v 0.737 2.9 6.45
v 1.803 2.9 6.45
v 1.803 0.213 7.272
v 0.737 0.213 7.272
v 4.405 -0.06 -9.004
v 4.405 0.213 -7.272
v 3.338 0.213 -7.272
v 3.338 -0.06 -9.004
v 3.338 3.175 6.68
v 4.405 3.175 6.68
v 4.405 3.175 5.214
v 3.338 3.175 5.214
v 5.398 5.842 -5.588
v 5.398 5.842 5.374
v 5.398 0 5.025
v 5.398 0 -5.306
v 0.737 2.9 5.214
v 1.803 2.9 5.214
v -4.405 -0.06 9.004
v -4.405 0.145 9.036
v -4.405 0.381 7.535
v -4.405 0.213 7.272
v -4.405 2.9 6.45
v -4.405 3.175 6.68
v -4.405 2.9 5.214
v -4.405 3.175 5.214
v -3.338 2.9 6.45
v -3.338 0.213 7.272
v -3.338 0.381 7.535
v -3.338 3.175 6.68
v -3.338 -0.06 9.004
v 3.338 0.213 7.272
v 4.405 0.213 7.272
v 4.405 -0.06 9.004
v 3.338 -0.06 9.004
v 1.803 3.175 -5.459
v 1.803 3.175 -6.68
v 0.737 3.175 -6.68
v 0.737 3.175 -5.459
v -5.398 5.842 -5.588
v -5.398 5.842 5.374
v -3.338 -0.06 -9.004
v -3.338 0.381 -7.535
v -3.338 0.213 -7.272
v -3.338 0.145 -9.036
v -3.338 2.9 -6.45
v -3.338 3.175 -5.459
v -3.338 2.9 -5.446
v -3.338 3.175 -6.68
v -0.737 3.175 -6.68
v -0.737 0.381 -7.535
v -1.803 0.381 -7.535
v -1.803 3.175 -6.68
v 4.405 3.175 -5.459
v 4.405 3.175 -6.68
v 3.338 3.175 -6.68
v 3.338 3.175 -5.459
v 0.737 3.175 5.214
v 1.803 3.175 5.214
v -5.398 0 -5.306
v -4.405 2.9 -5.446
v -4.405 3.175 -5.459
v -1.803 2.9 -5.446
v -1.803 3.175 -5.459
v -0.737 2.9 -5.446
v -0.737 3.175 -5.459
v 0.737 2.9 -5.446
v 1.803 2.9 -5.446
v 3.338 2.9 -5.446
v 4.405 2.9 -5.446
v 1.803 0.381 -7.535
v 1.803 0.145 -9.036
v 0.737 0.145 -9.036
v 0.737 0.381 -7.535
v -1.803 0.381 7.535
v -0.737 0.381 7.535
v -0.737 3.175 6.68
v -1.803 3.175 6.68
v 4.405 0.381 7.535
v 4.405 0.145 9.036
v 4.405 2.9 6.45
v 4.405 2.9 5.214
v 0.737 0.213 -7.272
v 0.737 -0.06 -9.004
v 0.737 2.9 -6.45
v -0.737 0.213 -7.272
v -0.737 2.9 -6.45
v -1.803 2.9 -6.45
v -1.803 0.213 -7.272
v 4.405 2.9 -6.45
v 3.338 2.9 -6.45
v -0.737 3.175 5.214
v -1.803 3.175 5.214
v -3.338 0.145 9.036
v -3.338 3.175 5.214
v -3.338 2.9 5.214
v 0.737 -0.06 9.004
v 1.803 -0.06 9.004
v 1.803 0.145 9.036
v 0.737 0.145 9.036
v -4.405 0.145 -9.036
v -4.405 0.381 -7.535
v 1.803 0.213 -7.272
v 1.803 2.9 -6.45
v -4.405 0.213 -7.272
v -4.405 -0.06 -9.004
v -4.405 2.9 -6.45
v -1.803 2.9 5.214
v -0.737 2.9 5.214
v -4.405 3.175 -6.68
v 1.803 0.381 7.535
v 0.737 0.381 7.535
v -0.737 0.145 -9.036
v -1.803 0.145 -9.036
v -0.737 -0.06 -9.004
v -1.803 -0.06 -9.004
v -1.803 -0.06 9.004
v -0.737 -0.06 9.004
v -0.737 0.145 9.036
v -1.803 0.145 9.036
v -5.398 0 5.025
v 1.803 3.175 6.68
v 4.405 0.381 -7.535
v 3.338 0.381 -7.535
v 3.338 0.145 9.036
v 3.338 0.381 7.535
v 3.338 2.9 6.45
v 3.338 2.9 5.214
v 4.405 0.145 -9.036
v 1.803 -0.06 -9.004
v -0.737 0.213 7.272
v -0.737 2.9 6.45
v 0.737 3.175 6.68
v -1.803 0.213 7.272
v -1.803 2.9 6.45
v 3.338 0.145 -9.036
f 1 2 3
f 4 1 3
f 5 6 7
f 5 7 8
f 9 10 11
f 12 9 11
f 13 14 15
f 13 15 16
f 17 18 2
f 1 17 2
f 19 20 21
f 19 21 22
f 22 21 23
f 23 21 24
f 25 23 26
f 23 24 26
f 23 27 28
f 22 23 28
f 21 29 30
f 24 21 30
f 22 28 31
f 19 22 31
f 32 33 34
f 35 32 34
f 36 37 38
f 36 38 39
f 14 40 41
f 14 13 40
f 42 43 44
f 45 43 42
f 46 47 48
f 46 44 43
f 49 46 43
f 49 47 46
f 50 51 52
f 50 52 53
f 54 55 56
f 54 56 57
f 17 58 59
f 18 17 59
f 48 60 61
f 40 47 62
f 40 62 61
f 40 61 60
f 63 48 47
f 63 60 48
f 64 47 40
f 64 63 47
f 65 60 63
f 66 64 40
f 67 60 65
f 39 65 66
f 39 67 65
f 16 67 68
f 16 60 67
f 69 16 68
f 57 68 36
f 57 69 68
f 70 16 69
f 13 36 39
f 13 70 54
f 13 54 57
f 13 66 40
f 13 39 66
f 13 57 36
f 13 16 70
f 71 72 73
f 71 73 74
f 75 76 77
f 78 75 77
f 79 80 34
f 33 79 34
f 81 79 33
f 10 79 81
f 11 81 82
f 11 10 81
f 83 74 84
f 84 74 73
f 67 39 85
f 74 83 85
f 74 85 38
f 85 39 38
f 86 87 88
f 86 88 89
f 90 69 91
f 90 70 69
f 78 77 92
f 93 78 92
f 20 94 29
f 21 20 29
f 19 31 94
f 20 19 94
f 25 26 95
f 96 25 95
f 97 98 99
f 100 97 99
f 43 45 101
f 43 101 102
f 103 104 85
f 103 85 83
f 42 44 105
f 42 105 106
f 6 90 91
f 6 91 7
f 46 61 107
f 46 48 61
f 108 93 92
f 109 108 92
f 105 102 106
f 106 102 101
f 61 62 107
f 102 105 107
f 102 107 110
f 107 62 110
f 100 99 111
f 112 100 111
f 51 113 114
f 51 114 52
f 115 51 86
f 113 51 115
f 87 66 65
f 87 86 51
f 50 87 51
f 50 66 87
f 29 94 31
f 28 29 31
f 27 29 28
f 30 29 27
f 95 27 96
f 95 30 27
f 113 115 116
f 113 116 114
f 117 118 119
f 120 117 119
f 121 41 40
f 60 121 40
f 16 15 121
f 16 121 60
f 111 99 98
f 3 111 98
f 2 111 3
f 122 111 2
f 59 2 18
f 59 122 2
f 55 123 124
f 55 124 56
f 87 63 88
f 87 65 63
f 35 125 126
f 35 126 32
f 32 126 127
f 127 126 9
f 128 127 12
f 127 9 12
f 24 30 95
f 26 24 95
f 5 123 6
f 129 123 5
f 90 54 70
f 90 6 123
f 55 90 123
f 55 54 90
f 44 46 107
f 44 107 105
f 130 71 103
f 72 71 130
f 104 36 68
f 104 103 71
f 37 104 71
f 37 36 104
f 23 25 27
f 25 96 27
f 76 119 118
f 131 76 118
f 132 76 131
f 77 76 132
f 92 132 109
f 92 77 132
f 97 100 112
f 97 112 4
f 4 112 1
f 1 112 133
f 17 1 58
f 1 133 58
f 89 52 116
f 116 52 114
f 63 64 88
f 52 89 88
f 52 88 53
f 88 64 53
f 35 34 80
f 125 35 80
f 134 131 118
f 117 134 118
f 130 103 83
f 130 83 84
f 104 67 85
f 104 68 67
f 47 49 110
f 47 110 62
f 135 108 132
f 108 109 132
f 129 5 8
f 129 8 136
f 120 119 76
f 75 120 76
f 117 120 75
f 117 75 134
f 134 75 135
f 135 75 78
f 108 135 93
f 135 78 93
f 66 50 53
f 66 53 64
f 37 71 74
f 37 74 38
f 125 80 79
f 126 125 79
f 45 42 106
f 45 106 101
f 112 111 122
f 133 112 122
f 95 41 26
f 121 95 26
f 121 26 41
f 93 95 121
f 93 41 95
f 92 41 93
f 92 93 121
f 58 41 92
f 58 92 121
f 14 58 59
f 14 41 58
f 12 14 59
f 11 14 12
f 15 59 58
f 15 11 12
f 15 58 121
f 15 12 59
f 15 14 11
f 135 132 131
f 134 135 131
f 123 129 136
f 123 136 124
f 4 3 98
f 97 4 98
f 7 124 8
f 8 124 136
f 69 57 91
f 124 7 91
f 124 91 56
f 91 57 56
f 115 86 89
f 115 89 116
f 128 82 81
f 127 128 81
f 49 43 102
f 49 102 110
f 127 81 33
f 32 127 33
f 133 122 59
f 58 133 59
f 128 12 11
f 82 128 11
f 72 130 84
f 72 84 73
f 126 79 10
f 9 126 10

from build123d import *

# Parameters (mm, degrees)
EXTRUDE2_DEPTH      = 5.3975
EXTRUDE2_2_DEPTH    = 5.3975
SKETCH5_OUTSIDE_W   = 17.054
SKETCH5_OUTSIDE_H   = 24.332
SKETCH5_OUTSIDE_W_2 = 1.0668
SKETCH5_OUTSIDE_H_2 = 3.821737789
EXTRUDE3_DEPTH      = 4.235451139
EXTRUDE1_DEPTH      = 5.3975


with BuildPart() as part:
    # Sketch4 → Extrude2 (new body, symmetric)
    with BuildSketch(Plane(origin=(0, 0, 0), x_dir=(0, 0, -1), z_dir=(1, 0, 0))):
        Polygon((-5.19804058, 2.899559181), (-6.449967698, 2.899559181), (-7.271937219, 0.212691069), (-9.00398363, -0.060143282), (-9.0362215, 0.144513818), (-7.534579159, 0.381054601), (-6.679758262, 3.175307857), (-5.214483711, 3.175307857), align=None)
    extrude(amount=EXTRUDE2_DEPTH, both=True)


with BuildPart() as body_2:
    # Sketch4 → Extrude2 2 (new body, symmetric)
    with BuildSketch(Plane(origin=(0, 0, 0), x_dir=(0, 0, -1), z_dir=(1, 0, 0))):
        Polygon((5.214483711, 3.175307857), (5.19804058, 2.899559181), (6.449967698, 2.899559181), (7.271937219, 0.212691069), (9.00398363, -0.060143282), (9.0362215, 0.144513818), (7.534579159, 0.381054601), (6.679758262, 3.175307857), align=None)
    extrude(amount=EXTRUDE2_2_DEPTH, both=True)


with BuildPart() as extrude3_tool:
    # Sketch5 outside → Extrude3 (new body, through all)
    with BuildSketch(Plane(origin=(0, 3.175307857, 0), x_dir=(1, 0, 0), z_dir=(0, 1, 0))):
        Rectangle(SKETCH5_OUTSIDE_W, SKETCH5_OUTSIDE_H)
        with Locations((-3.871213345, -7.125352605)):
            Rectangle(SKETCH5_OUTSIDE_W_2, SKETCH5_OUTSIDE_H_2, mode=Mode.SUBTRACT)
        with Locations((-1.27, -7.125352605)):
            Rectangle(SKETCH5_OUTSIDE_W_2, SKETCH5_OUTSIDE_H_2, mode=Mode.SUBTRACT)
        with Locations((3.871213345, -7.125352605)):
            Rectangle(SKETCH5_OUTSIDE_W_2, SKETCH5_OUTSIDE_H_2, mode=Mode.SUBTRACT)
        with Locations((1.27, -7.125352605)):
            Rectangle(SKETCH5_OUTSIDE_W_2, SKETCH5_OUTSIDE_H_2, mode=Mode.SUBTRACT)
        with Locations((-3.871213345, 7.125352605)):
            Rectangle(SKETCH5_OUTSIDE_W_2, SKETCH5_OUTSIDE_H_2, mode=Mode.SUBTRACT)
        with Locations((-1.27, 7.125352605)):
            Rectangle(SKETCH5_OUTSIDE_W_2, SKETCH5_OUTSIDE_H_2, mode=Mode.SUBTRACT)
        with Locations((1.27, 7.125352605)):
            Rectangle(SKETCH5_OUTSIDE_W_2, SKETCH5_OUTSIDE_H_2, mode=Mode.SUBTRACT)
        with Locations((3.871213345, 7.125352605)):
            Rectangle(SKETCH5_OUTSIDE_W_2, SKETCH5_OUTSIDE_H_2, mode=Mode.SUBTRACT)
    extrude(amount=-EXTRUDE3_DEPTH)


with BuildPart() as part_1:
    add(part.part)

    # Extrude3: cut by extrude3_tool
    add(extrude3_tool.part, mode=Mode.SUBTRACT)



with BuildPart() as body_2_1:
    add(body_2.part)

    # Extrude3: cut by extrude3_tool
    add(extrude3_tool.part, mode=Mode.SUBTRACT)


with BuildPart() as part_2:
    add(part_1.part)

    add(body_2_1.part)  # Extrude1 merges body 2
    # Sketch2 → Extrude1 (add, symmetric)
    with BuildSketch(Plane(origin=(0, 0, 0), x_dir=(0, 0, -1), z_dir=(1, 0, 0))):
        Polygon((5.587899815, 5.842), (-5.37350086, 5.842), (-5.02513737, 0), (5.306040159, 0), align=None)
    extrude(amount=EXTRUDE1_DEPTH, both=True)


solid = part_2.part
